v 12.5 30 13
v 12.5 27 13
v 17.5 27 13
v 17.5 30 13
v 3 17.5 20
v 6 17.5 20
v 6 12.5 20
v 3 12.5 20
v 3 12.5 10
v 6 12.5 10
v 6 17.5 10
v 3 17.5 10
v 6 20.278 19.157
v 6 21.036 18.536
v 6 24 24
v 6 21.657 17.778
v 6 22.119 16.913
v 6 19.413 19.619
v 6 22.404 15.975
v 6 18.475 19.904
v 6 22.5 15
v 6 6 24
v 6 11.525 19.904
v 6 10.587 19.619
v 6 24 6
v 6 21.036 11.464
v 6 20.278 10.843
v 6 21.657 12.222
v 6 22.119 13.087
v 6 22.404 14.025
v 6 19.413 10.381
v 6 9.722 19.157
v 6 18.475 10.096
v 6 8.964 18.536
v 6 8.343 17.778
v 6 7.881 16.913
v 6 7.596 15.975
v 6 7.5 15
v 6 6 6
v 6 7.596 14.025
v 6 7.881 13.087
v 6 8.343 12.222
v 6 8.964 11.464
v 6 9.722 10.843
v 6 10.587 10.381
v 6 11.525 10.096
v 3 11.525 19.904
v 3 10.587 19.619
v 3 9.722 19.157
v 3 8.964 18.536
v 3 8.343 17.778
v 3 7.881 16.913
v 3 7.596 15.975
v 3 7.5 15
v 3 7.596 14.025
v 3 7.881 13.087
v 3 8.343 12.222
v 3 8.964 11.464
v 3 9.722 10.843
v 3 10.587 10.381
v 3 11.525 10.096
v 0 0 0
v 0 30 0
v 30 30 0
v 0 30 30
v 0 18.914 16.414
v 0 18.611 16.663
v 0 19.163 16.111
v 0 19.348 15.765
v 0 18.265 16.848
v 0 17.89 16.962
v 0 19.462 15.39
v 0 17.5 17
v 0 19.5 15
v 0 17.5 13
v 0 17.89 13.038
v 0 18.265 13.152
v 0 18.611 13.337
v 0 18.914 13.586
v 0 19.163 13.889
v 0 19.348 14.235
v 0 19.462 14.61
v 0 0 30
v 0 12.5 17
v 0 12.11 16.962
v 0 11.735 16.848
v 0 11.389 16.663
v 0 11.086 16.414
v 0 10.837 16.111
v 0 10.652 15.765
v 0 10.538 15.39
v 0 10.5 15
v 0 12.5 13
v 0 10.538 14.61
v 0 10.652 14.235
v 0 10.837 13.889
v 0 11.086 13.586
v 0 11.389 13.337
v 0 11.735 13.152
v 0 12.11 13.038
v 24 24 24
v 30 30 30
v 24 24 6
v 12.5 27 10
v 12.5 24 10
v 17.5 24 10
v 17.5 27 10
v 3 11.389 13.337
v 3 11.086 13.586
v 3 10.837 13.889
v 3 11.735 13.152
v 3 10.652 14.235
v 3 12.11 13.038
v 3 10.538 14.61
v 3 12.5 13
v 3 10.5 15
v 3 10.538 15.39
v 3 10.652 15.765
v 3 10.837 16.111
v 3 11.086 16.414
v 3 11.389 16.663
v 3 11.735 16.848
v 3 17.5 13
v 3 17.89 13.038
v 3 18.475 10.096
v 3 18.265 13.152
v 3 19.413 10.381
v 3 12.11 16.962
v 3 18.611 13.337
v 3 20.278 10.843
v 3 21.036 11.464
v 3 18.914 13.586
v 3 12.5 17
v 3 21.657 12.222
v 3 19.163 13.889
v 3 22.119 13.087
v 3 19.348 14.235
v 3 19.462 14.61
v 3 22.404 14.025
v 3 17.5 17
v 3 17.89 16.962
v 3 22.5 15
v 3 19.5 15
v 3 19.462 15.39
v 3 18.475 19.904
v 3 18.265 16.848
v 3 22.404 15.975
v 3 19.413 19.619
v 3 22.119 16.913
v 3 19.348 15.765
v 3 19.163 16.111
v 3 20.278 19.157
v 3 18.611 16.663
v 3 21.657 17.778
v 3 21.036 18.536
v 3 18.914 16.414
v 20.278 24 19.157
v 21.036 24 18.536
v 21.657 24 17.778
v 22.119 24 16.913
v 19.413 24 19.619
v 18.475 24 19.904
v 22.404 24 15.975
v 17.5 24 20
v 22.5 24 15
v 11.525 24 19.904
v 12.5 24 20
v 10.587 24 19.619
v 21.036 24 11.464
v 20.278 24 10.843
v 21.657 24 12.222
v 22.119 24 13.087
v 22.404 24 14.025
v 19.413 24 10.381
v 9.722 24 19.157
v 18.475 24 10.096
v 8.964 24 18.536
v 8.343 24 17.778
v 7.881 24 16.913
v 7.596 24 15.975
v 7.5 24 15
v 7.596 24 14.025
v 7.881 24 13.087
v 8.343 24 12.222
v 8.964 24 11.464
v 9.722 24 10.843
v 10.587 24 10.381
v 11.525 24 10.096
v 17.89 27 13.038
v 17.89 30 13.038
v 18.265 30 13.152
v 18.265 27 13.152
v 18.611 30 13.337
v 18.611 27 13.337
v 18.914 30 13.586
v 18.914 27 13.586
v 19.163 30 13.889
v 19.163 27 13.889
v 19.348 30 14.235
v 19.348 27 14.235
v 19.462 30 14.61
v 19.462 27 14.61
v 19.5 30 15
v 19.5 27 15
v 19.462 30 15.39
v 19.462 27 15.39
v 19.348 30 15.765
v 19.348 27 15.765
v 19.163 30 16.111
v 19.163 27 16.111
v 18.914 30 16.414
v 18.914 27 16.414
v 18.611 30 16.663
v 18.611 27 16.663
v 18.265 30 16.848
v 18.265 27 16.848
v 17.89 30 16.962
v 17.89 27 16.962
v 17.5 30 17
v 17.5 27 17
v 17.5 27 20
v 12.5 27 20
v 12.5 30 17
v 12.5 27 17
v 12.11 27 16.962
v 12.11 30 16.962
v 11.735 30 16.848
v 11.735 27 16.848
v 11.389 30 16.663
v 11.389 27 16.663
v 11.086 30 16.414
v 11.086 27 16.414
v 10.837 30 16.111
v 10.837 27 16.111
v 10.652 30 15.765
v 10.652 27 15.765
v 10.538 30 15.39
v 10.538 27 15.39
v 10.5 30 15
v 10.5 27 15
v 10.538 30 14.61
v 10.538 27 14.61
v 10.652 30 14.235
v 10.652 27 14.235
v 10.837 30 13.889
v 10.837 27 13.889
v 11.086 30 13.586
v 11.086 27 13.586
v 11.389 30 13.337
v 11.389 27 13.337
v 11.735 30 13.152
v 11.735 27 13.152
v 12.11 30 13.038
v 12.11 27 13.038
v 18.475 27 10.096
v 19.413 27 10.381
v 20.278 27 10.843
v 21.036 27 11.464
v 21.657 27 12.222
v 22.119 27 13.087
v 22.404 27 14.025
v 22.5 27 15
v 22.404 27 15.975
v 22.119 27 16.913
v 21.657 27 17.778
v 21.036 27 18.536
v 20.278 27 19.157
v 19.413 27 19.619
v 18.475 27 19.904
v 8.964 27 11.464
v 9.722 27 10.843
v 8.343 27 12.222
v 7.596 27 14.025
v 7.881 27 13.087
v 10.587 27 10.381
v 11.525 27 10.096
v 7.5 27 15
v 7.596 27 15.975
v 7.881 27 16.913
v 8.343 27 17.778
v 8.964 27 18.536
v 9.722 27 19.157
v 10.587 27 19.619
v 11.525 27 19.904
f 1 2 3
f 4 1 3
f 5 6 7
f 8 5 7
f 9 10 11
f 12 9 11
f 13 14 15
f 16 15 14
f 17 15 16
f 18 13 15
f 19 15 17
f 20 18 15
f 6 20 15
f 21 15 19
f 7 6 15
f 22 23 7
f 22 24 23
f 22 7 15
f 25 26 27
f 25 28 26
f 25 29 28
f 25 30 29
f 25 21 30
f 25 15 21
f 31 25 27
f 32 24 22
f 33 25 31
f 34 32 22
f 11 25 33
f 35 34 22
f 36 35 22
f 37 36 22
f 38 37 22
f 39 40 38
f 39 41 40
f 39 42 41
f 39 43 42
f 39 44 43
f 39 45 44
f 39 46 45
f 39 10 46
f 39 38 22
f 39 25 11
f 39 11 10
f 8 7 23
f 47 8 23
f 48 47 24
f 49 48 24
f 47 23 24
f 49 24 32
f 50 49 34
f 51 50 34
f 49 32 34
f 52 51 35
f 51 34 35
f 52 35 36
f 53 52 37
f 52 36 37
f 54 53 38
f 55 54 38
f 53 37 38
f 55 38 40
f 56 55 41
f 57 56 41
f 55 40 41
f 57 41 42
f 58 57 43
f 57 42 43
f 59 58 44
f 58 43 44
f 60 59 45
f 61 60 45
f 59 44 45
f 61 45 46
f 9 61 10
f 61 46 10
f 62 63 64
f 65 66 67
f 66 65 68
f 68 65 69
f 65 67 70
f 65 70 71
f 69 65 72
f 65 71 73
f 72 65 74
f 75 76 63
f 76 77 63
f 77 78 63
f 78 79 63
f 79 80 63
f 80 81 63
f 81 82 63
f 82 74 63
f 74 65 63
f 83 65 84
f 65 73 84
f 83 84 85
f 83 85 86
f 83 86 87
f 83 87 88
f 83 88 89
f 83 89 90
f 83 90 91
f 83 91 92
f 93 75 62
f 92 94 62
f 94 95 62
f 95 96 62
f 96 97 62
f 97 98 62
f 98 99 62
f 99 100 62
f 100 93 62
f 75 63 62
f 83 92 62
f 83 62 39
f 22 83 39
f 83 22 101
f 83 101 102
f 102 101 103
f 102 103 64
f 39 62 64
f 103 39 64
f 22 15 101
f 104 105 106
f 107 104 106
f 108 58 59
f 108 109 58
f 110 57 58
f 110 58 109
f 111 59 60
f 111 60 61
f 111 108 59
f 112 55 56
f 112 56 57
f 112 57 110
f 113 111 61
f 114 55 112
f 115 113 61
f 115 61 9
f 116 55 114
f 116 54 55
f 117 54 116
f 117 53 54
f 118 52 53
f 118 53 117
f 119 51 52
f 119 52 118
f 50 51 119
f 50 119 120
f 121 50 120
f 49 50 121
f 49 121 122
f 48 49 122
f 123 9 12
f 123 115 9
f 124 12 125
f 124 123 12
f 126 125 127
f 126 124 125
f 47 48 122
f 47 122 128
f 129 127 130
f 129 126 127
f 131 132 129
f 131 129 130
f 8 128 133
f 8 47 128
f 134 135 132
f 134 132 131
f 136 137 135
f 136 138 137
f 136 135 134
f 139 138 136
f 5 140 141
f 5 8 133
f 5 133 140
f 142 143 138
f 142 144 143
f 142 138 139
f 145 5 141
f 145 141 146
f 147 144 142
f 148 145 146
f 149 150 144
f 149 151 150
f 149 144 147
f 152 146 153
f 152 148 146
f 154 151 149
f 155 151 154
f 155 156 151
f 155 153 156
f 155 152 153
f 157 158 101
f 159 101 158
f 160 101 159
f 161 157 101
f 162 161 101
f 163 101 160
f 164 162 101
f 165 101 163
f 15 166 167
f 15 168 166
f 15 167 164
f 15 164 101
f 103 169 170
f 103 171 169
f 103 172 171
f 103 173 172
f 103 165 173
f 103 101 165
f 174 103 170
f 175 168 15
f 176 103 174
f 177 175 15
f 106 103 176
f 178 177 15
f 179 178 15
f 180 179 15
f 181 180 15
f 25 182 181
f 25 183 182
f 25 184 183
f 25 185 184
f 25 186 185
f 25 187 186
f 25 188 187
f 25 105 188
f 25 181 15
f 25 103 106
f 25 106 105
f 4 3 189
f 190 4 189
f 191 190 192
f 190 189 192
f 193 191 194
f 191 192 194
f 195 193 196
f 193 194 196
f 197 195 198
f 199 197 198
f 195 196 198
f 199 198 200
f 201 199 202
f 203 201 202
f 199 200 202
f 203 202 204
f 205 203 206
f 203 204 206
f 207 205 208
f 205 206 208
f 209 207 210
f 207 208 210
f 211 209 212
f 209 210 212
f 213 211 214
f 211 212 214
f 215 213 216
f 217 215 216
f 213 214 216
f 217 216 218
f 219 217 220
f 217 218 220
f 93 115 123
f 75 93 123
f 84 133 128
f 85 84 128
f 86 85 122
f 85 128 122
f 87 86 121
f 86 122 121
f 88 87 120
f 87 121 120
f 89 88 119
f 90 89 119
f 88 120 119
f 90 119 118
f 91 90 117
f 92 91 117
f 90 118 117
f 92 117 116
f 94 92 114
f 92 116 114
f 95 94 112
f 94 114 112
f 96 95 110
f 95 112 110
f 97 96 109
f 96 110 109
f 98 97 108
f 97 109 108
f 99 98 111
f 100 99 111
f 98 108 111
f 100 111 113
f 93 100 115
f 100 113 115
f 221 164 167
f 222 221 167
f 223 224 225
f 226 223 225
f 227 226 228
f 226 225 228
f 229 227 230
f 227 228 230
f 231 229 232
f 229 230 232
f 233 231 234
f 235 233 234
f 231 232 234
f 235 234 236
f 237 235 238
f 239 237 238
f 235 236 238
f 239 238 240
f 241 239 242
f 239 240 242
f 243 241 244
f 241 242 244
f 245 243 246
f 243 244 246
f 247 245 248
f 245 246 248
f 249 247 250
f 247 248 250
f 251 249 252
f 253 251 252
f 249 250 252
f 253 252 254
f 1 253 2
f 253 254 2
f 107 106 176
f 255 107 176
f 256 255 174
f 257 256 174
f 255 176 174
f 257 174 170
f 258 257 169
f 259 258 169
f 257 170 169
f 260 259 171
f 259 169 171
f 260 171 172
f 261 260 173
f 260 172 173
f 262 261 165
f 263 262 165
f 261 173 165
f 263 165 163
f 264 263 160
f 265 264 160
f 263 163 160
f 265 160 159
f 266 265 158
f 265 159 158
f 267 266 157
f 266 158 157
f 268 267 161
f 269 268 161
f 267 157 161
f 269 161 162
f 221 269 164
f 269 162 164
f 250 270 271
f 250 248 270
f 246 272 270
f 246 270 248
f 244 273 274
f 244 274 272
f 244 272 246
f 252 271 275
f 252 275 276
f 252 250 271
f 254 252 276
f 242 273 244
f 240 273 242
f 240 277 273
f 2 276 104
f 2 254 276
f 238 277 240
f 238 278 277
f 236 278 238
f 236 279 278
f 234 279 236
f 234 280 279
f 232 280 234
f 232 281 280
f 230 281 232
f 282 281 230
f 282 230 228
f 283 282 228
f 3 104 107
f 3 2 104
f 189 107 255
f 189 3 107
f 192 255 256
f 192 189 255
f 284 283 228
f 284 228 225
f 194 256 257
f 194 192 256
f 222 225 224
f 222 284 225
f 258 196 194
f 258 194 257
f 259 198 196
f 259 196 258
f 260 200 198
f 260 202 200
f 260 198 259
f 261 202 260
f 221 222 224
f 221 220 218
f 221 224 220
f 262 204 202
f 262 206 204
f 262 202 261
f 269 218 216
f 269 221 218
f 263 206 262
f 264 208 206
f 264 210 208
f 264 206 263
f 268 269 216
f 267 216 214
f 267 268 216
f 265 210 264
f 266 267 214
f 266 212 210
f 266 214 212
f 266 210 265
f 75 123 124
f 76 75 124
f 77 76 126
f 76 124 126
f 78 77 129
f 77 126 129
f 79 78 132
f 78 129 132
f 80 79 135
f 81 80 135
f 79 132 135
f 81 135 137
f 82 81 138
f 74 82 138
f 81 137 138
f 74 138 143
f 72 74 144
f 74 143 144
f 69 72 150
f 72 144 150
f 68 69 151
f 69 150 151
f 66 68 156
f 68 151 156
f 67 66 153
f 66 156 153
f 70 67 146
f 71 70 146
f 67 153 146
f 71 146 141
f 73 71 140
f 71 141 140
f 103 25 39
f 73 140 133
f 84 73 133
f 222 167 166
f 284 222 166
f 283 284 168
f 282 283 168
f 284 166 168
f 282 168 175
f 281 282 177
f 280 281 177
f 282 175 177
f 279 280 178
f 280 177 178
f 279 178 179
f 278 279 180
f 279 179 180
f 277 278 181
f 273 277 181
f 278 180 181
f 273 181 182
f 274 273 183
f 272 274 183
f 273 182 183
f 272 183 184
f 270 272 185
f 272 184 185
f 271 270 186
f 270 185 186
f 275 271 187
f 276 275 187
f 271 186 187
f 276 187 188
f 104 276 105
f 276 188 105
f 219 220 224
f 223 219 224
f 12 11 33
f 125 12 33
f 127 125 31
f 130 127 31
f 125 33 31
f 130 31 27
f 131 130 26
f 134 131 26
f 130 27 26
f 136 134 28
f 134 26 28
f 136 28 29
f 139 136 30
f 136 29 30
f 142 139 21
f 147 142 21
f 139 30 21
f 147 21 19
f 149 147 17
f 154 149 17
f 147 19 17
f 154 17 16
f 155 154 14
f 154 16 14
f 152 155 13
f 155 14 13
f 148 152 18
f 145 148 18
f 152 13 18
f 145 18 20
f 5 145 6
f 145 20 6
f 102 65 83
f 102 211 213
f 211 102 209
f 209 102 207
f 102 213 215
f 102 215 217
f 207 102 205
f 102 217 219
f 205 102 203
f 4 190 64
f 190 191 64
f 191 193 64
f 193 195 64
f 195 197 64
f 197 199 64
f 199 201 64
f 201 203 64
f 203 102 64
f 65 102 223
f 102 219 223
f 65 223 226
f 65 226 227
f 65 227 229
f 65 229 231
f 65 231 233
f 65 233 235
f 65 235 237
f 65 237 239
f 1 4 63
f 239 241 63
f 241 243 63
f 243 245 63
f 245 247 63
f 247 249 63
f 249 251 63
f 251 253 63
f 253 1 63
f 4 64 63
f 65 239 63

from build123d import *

# Parameters (mm, degrees)
F1_DEPTH  = 30
F2_T      = -6
F4_DEPTH  = 6.001
F6_DEPTH  = 3
F8_DEPTH  = 6.001
F10_DEPTH = 3


with BuildPart() as f1:
    # F0 (on Top) → F1 (new body)
    with BuildSketch(Plane.XY):
        Polygon((0, 30), (0, 0), (30, 30), align=None)
    extrude(amount=F1_DEPTH)

    # F2
    f2_openings = [f1.faces().sort_by_distance(p)[0] for p in [
        (15, 15, 15),
    ]]
    offset(amount=F2_T, openings=f2_openings)

    # F3 (on face) → F4 (cut, through all)
    with BuildSketch(Plane.XZ.offset(-24)):
        with BuildLine():
            ThreePointArc((17.5, 13), (19.5, 15), (17.5, 17))
            Line((17.5, 17), (12.5, 17))
            ThreePointArc((12.5, 17), (10.5, 15), (12.5, 13))
            Line((12.5, 13), (17.5, 13))
        make_face()
    extrude(amount=-F4_DEPTH, mode=Mode.SUBTRACT)

    # F5 (on face) → F6 (cut)
    with BuildSketch(Plane.XZ.offset(-24)):
        with BuildLine():
            ThreePointArc((17.5, 10), (22.5, 15), (17.5, 20))
            Line((17.5, 20), (12.5, 20))
            ThreePointArc((12.5, 20), (7.5, 15), (12.5, 10))
            Line((12.5, 10), (17.5, 10))
        make_face()
    extrude(amount=-F6_DEPTH, mode=Mode.SUBTRACT)

    # F7 (on face) → F8 (cut, through all)
    with BuildSketch(Plane.YZ.offset(6)):
        with BuildLine():
            ThreePointArc((17.5, 13), (19.5, 15), (17.5, 17))
            Line((17.5, 17), (12.5, 17))
            ThreePointArc((12.5, 17), (10.5, 15), (12.5, 13))
            Line((12.5, 13), (17.5, 13))
        make_face()
    extrude(amount=-F8_DEPTH, mode=Mode.SUBTRACT)

    # F9 (on face) → F10 (cut)
    with BuildSketch(Plane.YZ.offset(6)):
        with BuildLine():
            ThreePointArc((12.5, 20), (7.5, 15), (12.5, 10))
            Line((12.5, 10), (17.5, 10))
            ThreePointArc((17.5, 10), (22.5, 15), (17.5, 20))
            Line((17.5, 20), (12.5, 20))
        make_face()
    extrude(amount=-F10_DEPTH, mode=Mode.SUBTRACT)


solid = f1.part
